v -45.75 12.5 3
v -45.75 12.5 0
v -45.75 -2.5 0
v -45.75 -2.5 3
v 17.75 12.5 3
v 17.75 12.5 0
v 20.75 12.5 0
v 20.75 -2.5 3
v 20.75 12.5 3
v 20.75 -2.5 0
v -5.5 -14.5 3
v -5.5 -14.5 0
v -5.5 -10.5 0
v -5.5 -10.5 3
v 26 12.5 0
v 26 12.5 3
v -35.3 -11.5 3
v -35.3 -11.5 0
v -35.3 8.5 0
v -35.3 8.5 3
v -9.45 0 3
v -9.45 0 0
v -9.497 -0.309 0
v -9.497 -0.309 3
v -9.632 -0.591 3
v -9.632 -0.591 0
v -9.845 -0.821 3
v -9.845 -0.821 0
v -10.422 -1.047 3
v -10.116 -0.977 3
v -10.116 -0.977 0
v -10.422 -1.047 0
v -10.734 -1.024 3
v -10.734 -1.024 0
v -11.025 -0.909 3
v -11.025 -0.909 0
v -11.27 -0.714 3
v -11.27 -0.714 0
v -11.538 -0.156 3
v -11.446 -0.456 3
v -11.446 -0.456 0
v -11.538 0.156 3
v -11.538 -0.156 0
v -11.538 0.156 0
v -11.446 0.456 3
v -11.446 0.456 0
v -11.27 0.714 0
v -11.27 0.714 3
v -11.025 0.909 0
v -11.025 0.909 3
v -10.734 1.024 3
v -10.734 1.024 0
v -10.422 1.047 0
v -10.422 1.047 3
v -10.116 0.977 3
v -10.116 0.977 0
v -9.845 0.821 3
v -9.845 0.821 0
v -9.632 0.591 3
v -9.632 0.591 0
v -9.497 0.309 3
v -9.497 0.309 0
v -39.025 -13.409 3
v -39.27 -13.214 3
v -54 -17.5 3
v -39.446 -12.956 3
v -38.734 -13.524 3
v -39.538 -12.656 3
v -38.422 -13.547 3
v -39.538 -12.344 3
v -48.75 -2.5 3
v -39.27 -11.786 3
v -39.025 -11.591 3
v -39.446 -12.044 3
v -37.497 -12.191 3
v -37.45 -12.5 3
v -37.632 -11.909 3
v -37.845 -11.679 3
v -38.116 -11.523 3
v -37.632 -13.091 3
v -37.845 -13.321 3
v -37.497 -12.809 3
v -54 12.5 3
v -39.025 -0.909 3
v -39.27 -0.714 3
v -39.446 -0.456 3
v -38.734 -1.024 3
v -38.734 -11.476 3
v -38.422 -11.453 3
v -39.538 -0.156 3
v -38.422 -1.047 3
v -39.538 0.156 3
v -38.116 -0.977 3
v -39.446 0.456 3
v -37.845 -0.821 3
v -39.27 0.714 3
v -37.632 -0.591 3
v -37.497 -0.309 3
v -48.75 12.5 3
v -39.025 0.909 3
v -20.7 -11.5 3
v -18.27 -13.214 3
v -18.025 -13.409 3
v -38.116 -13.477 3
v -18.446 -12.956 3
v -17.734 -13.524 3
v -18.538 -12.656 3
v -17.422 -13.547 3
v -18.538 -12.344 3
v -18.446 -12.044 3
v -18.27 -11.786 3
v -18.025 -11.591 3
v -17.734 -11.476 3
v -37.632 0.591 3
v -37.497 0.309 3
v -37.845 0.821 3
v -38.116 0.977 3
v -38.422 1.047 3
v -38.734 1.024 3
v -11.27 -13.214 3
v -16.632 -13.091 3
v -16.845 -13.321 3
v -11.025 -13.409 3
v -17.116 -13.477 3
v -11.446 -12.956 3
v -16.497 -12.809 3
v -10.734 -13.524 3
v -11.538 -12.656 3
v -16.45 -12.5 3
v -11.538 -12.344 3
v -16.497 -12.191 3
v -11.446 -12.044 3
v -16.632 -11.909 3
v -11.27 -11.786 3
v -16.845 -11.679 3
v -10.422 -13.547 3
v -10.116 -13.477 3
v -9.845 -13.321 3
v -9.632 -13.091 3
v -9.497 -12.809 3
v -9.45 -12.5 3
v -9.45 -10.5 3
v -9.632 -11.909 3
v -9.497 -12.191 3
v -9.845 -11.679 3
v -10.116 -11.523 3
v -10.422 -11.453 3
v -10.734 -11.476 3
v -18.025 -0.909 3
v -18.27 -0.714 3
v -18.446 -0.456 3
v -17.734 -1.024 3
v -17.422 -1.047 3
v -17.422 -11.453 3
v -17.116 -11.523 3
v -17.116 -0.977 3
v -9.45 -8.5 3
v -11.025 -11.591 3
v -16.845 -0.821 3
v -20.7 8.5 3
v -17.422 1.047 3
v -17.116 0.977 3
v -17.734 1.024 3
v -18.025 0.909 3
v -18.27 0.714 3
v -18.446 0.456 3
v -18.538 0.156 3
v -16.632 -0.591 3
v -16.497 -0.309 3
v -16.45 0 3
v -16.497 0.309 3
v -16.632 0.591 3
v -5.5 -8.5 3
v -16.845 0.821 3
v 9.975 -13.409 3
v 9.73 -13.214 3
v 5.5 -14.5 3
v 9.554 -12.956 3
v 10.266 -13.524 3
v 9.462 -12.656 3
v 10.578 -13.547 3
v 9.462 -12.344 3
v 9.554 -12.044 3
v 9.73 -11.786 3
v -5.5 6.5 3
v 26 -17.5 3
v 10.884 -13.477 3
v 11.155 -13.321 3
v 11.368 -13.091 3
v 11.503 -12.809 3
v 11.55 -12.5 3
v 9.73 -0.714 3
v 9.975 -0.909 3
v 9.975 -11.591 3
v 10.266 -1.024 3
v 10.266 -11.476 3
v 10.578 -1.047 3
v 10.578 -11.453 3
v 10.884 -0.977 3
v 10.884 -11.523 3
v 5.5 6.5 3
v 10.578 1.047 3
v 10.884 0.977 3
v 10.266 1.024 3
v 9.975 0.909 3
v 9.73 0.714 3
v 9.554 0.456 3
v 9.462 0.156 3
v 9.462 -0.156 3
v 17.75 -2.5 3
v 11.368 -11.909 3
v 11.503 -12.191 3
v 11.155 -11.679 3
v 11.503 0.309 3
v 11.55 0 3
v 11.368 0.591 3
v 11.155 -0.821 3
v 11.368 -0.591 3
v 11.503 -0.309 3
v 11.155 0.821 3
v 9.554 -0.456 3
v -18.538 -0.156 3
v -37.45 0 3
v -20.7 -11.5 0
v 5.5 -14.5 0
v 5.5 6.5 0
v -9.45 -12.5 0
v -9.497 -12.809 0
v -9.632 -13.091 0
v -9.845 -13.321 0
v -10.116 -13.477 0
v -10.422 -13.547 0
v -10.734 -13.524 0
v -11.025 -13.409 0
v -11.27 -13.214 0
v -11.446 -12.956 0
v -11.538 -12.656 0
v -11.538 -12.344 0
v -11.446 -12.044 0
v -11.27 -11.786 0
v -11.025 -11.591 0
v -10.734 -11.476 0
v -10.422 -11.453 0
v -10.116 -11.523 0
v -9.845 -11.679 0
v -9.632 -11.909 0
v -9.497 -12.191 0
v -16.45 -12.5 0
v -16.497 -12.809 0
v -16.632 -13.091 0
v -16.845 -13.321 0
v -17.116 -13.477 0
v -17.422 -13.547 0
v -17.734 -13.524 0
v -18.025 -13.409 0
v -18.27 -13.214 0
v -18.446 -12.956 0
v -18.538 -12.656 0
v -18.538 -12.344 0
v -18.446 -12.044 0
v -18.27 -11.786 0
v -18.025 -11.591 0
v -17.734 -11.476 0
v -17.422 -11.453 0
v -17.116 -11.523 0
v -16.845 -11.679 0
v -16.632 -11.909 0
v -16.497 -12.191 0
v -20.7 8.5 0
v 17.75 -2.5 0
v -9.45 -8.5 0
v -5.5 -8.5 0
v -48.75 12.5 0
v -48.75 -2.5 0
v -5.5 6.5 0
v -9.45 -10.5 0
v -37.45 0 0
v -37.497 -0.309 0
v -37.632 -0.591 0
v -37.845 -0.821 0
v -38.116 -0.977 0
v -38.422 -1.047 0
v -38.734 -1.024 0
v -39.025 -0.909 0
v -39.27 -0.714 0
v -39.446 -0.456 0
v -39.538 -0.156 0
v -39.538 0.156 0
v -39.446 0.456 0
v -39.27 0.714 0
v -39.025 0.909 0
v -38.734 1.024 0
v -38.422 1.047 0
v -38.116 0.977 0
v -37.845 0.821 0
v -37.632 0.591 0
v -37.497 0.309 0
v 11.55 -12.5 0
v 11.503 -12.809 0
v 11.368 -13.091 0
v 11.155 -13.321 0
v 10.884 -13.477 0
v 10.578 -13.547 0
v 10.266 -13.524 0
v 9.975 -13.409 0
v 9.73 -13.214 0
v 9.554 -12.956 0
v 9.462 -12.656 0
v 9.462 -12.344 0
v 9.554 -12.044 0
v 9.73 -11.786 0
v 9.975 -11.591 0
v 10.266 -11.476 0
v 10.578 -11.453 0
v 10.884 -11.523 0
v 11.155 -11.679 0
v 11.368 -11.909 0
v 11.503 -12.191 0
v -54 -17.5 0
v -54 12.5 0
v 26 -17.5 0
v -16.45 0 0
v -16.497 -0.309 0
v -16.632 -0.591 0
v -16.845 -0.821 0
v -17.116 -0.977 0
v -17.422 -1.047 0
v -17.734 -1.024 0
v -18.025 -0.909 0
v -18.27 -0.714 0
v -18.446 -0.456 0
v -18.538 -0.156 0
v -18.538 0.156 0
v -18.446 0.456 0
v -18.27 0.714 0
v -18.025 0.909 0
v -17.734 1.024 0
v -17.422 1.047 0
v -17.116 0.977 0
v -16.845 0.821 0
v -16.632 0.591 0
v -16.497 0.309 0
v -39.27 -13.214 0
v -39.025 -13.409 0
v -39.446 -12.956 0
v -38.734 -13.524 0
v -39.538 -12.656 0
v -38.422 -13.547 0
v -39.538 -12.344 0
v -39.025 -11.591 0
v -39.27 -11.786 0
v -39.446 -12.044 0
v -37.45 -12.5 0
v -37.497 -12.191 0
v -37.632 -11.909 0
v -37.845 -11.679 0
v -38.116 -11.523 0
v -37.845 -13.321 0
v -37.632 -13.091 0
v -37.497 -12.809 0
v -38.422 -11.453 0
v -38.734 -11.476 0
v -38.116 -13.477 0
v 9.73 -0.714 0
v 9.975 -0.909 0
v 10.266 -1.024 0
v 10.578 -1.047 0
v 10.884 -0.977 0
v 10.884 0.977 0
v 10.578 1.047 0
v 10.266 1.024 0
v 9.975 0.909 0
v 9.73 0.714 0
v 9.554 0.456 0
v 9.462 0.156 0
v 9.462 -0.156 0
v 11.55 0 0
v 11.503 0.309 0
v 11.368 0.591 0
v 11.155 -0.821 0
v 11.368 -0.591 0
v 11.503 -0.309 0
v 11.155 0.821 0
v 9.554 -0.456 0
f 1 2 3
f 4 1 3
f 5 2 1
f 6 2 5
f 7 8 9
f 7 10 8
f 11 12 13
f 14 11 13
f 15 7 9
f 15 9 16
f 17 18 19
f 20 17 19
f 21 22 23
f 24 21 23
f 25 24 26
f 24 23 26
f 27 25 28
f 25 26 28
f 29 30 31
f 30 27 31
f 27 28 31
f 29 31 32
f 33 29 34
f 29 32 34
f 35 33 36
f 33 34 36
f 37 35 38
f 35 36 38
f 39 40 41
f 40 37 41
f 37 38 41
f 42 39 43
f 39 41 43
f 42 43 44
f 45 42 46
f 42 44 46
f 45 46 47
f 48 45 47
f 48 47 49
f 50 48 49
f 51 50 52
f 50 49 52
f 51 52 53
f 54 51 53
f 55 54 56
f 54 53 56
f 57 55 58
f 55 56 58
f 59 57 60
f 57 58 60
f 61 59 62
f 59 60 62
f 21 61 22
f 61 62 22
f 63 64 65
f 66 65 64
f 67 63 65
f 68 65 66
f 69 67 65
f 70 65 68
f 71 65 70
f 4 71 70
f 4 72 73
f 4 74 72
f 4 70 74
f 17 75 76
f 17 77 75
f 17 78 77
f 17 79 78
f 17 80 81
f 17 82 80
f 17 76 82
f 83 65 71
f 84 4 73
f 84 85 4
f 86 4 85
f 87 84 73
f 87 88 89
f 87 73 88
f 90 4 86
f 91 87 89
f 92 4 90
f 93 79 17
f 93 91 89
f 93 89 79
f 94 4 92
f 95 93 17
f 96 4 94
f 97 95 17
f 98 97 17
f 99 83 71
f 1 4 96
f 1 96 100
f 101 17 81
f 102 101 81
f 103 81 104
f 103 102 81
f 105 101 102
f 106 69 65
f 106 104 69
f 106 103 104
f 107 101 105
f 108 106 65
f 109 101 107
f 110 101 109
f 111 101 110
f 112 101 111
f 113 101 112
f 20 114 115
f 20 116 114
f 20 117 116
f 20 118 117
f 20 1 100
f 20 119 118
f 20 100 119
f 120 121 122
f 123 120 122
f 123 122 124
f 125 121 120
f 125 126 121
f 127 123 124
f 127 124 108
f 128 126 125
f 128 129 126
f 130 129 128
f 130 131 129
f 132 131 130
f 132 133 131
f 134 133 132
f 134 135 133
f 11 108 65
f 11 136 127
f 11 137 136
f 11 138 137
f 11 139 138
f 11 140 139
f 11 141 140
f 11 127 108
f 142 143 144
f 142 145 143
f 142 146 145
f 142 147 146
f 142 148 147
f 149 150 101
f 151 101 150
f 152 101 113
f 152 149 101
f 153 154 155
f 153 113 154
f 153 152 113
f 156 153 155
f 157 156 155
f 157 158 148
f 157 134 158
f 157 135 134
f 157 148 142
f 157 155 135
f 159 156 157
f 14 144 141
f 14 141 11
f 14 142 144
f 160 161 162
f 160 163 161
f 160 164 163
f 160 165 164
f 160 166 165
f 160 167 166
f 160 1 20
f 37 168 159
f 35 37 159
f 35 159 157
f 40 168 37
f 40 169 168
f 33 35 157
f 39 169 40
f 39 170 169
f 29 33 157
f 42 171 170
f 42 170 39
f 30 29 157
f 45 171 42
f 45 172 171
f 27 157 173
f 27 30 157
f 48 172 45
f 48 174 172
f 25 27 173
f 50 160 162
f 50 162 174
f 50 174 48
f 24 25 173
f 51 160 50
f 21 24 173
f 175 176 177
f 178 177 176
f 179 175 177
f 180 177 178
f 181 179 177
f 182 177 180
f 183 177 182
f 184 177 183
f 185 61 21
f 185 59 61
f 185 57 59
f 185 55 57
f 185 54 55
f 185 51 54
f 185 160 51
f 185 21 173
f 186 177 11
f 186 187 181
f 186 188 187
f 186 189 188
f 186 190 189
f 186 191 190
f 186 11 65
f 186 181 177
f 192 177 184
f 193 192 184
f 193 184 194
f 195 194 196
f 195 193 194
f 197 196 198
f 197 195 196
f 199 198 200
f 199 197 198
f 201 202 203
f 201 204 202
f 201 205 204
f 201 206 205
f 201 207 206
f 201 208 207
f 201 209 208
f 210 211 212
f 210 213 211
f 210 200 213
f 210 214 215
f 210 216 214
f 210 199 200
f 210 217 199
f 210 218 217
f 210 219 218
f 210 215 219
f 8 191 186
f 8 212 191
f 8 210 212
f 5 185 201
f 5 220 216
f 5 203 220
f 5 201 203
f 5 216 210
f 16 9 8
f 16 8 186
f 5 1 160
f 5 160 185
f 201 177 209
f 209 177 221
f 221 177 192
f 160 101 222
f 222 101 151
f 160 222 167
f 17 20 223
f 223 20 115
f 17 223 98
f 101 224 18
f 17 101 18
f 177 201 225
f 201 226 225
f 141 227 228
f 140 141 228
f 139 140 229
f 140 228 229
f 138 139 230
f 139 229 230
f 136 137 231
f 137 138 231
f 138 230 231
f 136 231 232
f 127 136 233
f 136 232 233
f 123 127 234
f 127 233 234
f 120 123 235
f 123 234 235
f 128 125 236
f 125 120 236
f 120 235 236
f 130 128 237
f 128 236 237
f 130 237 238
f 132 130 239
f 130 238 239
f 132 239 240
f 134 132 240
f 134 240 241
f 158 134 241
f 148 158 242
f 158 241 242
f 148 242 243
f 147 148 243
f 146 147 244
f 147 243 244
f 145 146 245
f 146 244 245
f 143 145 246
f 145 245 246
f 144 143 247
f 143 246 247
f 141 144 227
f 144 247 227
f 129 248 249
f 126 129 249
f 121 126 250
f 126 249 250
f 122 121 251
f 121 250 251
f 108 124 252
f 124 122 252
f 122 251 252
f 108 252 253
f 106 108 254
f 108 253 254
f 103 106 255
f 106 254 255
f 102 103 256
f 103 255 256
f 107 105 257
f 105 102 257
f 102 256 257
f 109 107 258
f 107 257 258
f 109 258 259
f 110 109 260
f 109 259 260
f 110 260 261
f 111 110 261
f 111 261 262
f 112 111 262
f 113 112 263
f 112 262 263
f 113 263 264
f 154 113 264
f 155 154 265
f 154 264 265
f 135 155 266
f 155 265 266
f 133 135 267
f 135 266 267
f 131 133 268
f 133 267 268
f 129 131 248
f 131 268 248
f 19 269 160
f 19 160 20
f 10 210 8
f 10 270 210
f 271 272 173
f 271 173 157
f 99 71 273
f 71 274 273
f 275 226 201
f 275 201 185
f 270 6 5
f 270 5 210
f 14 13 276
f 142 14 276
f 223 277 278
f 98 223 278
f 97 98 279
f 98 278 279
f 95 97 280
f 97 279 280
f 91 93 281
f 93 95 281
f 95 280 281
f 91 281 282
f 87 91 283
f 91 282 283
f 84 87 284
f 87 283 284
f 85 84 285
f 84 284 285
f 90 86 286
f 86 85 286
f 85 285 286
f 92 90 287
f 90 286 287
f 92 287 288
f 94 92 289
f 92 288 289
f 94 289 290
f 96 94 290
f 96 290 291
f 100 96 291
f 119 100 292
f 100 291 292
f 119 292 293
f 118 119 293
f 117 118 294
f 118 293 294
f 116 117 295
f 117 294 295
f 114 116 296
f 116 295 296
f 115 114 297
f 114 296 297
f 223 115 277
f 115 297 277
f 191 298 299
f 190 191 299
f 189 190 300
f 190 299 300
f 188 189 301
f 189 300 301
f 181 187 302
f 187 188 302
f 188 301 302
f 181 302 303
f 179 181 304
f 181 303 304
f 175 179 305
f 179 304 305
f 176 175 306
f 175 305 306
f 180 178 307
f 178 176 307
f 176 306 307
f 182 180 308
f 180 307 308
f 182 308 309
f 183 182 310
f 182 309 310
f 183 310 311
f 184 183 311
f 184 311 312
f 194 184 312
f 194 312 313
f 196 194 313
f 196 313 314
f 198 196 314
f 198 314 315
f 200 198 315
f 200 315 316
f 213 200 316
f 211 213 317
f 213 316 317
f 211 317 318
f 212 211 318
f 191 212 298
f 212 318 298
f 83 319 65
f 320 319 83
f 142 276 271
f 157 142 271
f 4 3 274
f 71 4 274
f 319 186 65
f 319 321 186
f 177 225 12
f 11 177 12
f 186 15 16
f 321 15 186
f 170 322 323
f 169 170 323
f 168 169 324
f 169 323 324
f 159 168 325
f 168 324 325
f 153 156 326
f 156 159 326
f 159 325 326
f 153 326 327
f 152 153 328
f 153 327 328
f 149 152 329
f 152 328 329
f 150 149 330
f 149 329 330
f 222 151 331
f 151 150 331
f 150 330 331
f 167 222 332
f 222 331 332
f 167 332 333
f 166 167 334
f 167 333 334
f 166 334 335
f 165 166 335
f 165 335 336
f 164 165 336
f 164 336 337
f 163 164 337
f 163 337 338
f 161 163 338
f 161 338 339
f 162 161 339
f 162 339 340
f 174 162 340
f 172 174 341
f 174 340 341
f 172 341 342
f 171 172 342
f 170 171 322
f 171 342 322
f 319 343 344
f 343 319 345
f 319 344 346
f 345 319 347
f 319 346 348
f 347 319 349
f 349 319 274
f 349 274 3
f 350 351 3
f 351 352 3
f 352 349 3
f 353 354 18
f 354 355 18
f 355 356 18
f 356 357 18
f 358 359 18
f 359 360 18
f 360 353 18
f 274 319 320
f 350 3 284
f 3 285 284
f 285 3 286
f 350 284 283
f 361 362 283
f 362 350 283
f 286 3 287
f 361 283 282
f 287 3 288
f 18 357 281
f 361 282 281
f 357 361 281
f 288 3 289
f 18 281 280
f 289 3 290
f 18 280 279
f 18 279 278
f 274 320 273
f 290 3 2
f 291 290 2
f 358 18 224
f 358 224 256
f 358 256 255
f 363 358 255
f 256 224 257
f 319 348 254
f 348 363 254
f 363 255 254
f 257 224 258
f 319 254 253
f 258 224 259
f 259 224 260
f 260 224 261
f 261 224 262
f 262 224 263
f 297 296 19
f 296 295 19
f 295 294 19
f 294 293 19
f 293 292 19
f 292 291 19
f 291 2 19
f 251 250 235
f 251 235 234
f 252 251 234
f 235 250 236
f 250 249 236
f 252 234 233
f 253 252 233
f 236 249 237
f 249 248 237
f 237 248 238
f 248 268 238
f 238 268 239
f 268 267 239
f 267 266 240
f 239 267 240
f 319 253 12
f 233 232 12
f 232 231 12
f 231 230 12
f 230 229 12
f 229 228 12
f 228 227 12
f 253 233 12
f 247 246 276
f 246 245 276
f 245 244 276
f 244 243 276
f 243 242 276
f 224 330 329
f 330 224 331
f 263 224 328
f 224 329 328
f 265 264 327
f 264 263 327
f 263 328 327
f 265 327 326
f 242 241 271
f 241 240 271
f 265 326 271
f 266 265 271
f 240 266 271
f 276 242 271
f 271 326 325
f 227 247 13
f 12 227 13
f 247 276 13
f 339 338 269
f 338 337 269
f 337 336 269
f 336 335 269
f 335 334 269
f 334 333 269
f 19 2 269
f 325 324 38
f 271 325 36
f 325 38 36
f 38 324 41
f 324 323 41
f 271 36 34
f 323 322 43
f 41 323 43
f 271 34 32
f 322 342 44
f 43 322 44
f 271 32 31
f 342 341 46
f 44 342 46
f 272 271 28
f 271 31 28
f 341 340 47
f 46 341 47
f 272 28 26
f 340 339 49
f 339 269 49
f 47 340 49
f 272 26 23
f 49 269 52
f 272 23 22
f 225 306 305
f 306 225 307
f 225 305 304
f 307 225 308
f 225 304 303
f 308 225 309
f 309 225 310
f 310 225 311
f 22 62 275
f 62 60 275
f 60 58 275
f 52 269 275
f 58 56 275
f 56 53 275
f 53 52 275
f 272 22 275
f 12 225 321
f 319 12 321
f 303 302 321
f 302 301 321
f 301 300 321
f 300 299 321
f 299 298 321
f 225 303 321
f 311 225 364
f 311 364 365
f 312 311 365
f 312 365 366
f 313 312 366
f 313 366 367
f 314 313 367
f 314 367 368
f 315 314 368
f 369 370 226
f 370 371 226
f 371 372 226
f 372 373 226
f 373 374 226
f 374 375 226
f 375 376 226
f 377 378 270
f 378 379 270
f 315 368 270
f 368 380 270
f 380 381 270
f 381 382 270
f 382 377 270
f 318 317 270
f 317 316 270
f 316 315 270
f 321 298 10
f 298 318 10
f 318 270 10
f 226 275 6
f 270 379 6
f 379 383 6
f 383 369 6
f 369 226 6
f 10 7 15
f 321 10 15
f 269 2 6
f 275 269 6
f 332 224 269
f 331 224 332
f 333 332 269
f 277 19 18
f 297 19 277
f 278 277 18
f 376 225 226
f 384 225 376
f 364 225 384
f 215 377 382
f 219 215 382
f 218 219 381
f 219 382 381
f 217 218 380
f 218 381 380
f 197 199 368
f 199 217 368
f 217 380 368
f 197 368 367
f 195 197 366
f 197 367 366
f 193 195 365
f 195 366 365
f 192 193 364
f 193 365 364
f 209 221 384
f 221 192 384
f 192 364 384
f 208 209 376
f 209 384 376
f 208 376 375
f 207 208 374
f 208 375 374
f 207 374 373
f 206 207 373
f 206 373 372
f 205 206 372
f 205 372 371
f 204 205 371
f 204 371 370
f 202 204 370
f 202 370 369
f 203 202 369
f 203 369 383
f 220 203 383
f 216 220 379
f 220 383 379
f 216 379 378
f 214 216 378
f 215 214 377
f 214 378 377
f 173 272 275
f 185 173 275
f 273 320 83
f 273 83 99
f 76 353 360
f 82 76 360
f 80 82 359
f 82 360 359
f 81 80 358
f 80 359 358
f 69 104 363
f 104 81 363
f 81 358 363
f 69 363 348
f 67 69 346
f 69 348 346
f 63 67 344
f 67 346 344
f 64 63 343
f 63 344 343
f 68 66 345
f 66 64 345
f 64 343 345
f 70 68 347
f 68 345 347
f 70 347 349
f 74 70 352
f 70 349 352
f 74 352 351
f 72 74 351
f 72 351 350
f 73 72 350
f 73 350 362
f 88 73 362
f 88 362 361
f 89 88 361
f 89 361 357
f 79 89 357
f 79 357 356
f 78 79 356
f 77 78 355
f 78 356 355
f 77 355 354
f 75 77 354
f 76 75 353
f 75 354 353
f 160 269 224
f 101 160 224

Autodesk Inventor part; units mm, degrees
ref_plane "YZ Plane" through (0, 0, 0) normal (1, 0, 0) x (0, 1, 0)
ref_plane "XZ Plane" through (0, 0, 0) normal (0, 1, 0) x (-1, 0, 0)
ref_plane "XY Plane" through (0, 0, 0) normal (0, 0, 1) x (1, 0, 0)
sketch "Sketch1" plane through (0, 0, 0) normal (0, 0, 1) x (1, 0, 0)
  line L0 (-12.5, 9.5) -> (-12.5, -14.5) construction
  line L1 (-15.5, -14.5) -> (-15.5, 9.5) construction
  line L2 (-12.5, -2.5) -> (-15.5, -2.5) construction
  line L3 (26, -17.5) -> (-54, -17.5)
  line L4 (-54, -17.5) -> (-54, 12.5)
  line L5 (-54, 12.5) -> (26, 12.5)
  line L6 (26, 12.5) -> (26, -17.5)
  line L7 (26, -17.5) -> (-54, 12.5) construction
  line L8 (-54, -17.5) -> (26, 12.5) construction
  line L9 (-12.5, -14.5) -> (12.5, -14.5) construction
  line L10 (12.5, -14.5) -> (12.5, 9.5) construction
  line L11 (12.5, 9.5) -> (-12.5, 9.5) construction
  line L12 (-15.5, 9.5) -> (-40.5, 9.5) construction
  line L13 (-40.5, 9.5) -> (-40.5, -14.5) construction
  line L14 (-40.5, -14.5) -> (-15.5, -14.5) construction
  line L15 (-8.7, -9.1) -> (-8.7, -9.9) construction
  line L16 (-8.7, -9.9) -> (-7.48, -9.9) construction
  line L17 (-7.48, -9.9) -> (-7.48, -9.1) construction
  line L18 (-7.48, -9.1) -> (-8.7, -9.1) construction
  circle A0 centre (-10.5, -12.5) radius 1.05 projected
  circle A1 centre (-10.5, 0) radius 1.05 projected
  circle A2 centre (10.5, 0) radius 1.05 projected
  circle A3 centre (10.5, -12.5) radius 1.05 projected
  circle A4 centre (-17.5, -12.5) radius 1.05 projected
  circle A5 centre (-17.5, 0) radius 1.05 projected
  circle A6 centre (-38.5, -12.5) radius 1.05 projected
  circle A7 centre (-38.5, 0) radius 1.05 projected
  line L19 (5.5, -14.5) -> (-5.5, -14.5)
  line L20 (5.5, 6.5) -> (5.5, -14.5)
  line L21 (-5.5, -10.5) -> (-9.45, -10.5)
  line L22 (-5.5, -8.5) -> (-9.45, -8.5)
  line L23 (-9.45, -10.5) -> (-9.45, -8.5)
  line L24 (-5.5, -14.5) -> (-5.5, -10.5)
  line L25 (-5.5, -8.5) -> (-5.5, 6.5)
  line L26 (-35.3, -11.5) -> (-35.3, 8.5)
  line L27 (-20.7, 8.5) -> (-20.7, -11.5)
  line L28 (5.5, 6.5) -> (-5.5, 6.5)
  line L29 (-20.7, -11.5) -> (-35.3, -11.5)
  line L30 (-20.7, 8.5) -> (-35.3, 8.5)
  line L31 (20.75, 12.5) -> (17.75, 12.5)
  line L32 (17.75, 12.5) -> (17.75, -2.5)
  line L33 (17.75, -2.5) -> (20.75, -2.5)
  line L34 (20.75, -2.5) -> (20.75, 12.5)
  line L35 (-14, -17.5) -> (-14, 12.5) construction
  line L36 (-48.75, 12.5) -> (-45.75, 12.5)
  line L37 (-45.75, 12.5) -> (-45.75, -2.5)
  line L38 (-45.75, -2.5) -> (-48.75, -2.5)
  line L39 (-48.75, -2.5) -> (-48.75, 12.5)
  point P0 (0, 0)
  point P1 (-14, -2.5)
  dimension "d0" = 80
  dimension "d1" = 30
  dimension "d2" = 7
  dimension "d4" = 4
  dimension "d6" = 18
  dimension "d7" = 7
  dimension "d8" = 7
  dimension "d9" = 3.05
  dimension "d10" = 3
  dimension "d11" = 5.2
  dimension "d12" = 5.2
  dimension "d13" = 3
  dimension "d14" = 3
  dimension "d15" = 1
  dimension "d16" = 15
  dimension "d17" = 5.25
  dimension "d18" = 13.5
  dimension "d19" = 3
extrude "Extrusion1" add sketch "Sketch1" along normal blind 3 contours L3 L4 L5 L39 L38 L37 L32 L33 L34 L6
properties part number "Camera bracket"
